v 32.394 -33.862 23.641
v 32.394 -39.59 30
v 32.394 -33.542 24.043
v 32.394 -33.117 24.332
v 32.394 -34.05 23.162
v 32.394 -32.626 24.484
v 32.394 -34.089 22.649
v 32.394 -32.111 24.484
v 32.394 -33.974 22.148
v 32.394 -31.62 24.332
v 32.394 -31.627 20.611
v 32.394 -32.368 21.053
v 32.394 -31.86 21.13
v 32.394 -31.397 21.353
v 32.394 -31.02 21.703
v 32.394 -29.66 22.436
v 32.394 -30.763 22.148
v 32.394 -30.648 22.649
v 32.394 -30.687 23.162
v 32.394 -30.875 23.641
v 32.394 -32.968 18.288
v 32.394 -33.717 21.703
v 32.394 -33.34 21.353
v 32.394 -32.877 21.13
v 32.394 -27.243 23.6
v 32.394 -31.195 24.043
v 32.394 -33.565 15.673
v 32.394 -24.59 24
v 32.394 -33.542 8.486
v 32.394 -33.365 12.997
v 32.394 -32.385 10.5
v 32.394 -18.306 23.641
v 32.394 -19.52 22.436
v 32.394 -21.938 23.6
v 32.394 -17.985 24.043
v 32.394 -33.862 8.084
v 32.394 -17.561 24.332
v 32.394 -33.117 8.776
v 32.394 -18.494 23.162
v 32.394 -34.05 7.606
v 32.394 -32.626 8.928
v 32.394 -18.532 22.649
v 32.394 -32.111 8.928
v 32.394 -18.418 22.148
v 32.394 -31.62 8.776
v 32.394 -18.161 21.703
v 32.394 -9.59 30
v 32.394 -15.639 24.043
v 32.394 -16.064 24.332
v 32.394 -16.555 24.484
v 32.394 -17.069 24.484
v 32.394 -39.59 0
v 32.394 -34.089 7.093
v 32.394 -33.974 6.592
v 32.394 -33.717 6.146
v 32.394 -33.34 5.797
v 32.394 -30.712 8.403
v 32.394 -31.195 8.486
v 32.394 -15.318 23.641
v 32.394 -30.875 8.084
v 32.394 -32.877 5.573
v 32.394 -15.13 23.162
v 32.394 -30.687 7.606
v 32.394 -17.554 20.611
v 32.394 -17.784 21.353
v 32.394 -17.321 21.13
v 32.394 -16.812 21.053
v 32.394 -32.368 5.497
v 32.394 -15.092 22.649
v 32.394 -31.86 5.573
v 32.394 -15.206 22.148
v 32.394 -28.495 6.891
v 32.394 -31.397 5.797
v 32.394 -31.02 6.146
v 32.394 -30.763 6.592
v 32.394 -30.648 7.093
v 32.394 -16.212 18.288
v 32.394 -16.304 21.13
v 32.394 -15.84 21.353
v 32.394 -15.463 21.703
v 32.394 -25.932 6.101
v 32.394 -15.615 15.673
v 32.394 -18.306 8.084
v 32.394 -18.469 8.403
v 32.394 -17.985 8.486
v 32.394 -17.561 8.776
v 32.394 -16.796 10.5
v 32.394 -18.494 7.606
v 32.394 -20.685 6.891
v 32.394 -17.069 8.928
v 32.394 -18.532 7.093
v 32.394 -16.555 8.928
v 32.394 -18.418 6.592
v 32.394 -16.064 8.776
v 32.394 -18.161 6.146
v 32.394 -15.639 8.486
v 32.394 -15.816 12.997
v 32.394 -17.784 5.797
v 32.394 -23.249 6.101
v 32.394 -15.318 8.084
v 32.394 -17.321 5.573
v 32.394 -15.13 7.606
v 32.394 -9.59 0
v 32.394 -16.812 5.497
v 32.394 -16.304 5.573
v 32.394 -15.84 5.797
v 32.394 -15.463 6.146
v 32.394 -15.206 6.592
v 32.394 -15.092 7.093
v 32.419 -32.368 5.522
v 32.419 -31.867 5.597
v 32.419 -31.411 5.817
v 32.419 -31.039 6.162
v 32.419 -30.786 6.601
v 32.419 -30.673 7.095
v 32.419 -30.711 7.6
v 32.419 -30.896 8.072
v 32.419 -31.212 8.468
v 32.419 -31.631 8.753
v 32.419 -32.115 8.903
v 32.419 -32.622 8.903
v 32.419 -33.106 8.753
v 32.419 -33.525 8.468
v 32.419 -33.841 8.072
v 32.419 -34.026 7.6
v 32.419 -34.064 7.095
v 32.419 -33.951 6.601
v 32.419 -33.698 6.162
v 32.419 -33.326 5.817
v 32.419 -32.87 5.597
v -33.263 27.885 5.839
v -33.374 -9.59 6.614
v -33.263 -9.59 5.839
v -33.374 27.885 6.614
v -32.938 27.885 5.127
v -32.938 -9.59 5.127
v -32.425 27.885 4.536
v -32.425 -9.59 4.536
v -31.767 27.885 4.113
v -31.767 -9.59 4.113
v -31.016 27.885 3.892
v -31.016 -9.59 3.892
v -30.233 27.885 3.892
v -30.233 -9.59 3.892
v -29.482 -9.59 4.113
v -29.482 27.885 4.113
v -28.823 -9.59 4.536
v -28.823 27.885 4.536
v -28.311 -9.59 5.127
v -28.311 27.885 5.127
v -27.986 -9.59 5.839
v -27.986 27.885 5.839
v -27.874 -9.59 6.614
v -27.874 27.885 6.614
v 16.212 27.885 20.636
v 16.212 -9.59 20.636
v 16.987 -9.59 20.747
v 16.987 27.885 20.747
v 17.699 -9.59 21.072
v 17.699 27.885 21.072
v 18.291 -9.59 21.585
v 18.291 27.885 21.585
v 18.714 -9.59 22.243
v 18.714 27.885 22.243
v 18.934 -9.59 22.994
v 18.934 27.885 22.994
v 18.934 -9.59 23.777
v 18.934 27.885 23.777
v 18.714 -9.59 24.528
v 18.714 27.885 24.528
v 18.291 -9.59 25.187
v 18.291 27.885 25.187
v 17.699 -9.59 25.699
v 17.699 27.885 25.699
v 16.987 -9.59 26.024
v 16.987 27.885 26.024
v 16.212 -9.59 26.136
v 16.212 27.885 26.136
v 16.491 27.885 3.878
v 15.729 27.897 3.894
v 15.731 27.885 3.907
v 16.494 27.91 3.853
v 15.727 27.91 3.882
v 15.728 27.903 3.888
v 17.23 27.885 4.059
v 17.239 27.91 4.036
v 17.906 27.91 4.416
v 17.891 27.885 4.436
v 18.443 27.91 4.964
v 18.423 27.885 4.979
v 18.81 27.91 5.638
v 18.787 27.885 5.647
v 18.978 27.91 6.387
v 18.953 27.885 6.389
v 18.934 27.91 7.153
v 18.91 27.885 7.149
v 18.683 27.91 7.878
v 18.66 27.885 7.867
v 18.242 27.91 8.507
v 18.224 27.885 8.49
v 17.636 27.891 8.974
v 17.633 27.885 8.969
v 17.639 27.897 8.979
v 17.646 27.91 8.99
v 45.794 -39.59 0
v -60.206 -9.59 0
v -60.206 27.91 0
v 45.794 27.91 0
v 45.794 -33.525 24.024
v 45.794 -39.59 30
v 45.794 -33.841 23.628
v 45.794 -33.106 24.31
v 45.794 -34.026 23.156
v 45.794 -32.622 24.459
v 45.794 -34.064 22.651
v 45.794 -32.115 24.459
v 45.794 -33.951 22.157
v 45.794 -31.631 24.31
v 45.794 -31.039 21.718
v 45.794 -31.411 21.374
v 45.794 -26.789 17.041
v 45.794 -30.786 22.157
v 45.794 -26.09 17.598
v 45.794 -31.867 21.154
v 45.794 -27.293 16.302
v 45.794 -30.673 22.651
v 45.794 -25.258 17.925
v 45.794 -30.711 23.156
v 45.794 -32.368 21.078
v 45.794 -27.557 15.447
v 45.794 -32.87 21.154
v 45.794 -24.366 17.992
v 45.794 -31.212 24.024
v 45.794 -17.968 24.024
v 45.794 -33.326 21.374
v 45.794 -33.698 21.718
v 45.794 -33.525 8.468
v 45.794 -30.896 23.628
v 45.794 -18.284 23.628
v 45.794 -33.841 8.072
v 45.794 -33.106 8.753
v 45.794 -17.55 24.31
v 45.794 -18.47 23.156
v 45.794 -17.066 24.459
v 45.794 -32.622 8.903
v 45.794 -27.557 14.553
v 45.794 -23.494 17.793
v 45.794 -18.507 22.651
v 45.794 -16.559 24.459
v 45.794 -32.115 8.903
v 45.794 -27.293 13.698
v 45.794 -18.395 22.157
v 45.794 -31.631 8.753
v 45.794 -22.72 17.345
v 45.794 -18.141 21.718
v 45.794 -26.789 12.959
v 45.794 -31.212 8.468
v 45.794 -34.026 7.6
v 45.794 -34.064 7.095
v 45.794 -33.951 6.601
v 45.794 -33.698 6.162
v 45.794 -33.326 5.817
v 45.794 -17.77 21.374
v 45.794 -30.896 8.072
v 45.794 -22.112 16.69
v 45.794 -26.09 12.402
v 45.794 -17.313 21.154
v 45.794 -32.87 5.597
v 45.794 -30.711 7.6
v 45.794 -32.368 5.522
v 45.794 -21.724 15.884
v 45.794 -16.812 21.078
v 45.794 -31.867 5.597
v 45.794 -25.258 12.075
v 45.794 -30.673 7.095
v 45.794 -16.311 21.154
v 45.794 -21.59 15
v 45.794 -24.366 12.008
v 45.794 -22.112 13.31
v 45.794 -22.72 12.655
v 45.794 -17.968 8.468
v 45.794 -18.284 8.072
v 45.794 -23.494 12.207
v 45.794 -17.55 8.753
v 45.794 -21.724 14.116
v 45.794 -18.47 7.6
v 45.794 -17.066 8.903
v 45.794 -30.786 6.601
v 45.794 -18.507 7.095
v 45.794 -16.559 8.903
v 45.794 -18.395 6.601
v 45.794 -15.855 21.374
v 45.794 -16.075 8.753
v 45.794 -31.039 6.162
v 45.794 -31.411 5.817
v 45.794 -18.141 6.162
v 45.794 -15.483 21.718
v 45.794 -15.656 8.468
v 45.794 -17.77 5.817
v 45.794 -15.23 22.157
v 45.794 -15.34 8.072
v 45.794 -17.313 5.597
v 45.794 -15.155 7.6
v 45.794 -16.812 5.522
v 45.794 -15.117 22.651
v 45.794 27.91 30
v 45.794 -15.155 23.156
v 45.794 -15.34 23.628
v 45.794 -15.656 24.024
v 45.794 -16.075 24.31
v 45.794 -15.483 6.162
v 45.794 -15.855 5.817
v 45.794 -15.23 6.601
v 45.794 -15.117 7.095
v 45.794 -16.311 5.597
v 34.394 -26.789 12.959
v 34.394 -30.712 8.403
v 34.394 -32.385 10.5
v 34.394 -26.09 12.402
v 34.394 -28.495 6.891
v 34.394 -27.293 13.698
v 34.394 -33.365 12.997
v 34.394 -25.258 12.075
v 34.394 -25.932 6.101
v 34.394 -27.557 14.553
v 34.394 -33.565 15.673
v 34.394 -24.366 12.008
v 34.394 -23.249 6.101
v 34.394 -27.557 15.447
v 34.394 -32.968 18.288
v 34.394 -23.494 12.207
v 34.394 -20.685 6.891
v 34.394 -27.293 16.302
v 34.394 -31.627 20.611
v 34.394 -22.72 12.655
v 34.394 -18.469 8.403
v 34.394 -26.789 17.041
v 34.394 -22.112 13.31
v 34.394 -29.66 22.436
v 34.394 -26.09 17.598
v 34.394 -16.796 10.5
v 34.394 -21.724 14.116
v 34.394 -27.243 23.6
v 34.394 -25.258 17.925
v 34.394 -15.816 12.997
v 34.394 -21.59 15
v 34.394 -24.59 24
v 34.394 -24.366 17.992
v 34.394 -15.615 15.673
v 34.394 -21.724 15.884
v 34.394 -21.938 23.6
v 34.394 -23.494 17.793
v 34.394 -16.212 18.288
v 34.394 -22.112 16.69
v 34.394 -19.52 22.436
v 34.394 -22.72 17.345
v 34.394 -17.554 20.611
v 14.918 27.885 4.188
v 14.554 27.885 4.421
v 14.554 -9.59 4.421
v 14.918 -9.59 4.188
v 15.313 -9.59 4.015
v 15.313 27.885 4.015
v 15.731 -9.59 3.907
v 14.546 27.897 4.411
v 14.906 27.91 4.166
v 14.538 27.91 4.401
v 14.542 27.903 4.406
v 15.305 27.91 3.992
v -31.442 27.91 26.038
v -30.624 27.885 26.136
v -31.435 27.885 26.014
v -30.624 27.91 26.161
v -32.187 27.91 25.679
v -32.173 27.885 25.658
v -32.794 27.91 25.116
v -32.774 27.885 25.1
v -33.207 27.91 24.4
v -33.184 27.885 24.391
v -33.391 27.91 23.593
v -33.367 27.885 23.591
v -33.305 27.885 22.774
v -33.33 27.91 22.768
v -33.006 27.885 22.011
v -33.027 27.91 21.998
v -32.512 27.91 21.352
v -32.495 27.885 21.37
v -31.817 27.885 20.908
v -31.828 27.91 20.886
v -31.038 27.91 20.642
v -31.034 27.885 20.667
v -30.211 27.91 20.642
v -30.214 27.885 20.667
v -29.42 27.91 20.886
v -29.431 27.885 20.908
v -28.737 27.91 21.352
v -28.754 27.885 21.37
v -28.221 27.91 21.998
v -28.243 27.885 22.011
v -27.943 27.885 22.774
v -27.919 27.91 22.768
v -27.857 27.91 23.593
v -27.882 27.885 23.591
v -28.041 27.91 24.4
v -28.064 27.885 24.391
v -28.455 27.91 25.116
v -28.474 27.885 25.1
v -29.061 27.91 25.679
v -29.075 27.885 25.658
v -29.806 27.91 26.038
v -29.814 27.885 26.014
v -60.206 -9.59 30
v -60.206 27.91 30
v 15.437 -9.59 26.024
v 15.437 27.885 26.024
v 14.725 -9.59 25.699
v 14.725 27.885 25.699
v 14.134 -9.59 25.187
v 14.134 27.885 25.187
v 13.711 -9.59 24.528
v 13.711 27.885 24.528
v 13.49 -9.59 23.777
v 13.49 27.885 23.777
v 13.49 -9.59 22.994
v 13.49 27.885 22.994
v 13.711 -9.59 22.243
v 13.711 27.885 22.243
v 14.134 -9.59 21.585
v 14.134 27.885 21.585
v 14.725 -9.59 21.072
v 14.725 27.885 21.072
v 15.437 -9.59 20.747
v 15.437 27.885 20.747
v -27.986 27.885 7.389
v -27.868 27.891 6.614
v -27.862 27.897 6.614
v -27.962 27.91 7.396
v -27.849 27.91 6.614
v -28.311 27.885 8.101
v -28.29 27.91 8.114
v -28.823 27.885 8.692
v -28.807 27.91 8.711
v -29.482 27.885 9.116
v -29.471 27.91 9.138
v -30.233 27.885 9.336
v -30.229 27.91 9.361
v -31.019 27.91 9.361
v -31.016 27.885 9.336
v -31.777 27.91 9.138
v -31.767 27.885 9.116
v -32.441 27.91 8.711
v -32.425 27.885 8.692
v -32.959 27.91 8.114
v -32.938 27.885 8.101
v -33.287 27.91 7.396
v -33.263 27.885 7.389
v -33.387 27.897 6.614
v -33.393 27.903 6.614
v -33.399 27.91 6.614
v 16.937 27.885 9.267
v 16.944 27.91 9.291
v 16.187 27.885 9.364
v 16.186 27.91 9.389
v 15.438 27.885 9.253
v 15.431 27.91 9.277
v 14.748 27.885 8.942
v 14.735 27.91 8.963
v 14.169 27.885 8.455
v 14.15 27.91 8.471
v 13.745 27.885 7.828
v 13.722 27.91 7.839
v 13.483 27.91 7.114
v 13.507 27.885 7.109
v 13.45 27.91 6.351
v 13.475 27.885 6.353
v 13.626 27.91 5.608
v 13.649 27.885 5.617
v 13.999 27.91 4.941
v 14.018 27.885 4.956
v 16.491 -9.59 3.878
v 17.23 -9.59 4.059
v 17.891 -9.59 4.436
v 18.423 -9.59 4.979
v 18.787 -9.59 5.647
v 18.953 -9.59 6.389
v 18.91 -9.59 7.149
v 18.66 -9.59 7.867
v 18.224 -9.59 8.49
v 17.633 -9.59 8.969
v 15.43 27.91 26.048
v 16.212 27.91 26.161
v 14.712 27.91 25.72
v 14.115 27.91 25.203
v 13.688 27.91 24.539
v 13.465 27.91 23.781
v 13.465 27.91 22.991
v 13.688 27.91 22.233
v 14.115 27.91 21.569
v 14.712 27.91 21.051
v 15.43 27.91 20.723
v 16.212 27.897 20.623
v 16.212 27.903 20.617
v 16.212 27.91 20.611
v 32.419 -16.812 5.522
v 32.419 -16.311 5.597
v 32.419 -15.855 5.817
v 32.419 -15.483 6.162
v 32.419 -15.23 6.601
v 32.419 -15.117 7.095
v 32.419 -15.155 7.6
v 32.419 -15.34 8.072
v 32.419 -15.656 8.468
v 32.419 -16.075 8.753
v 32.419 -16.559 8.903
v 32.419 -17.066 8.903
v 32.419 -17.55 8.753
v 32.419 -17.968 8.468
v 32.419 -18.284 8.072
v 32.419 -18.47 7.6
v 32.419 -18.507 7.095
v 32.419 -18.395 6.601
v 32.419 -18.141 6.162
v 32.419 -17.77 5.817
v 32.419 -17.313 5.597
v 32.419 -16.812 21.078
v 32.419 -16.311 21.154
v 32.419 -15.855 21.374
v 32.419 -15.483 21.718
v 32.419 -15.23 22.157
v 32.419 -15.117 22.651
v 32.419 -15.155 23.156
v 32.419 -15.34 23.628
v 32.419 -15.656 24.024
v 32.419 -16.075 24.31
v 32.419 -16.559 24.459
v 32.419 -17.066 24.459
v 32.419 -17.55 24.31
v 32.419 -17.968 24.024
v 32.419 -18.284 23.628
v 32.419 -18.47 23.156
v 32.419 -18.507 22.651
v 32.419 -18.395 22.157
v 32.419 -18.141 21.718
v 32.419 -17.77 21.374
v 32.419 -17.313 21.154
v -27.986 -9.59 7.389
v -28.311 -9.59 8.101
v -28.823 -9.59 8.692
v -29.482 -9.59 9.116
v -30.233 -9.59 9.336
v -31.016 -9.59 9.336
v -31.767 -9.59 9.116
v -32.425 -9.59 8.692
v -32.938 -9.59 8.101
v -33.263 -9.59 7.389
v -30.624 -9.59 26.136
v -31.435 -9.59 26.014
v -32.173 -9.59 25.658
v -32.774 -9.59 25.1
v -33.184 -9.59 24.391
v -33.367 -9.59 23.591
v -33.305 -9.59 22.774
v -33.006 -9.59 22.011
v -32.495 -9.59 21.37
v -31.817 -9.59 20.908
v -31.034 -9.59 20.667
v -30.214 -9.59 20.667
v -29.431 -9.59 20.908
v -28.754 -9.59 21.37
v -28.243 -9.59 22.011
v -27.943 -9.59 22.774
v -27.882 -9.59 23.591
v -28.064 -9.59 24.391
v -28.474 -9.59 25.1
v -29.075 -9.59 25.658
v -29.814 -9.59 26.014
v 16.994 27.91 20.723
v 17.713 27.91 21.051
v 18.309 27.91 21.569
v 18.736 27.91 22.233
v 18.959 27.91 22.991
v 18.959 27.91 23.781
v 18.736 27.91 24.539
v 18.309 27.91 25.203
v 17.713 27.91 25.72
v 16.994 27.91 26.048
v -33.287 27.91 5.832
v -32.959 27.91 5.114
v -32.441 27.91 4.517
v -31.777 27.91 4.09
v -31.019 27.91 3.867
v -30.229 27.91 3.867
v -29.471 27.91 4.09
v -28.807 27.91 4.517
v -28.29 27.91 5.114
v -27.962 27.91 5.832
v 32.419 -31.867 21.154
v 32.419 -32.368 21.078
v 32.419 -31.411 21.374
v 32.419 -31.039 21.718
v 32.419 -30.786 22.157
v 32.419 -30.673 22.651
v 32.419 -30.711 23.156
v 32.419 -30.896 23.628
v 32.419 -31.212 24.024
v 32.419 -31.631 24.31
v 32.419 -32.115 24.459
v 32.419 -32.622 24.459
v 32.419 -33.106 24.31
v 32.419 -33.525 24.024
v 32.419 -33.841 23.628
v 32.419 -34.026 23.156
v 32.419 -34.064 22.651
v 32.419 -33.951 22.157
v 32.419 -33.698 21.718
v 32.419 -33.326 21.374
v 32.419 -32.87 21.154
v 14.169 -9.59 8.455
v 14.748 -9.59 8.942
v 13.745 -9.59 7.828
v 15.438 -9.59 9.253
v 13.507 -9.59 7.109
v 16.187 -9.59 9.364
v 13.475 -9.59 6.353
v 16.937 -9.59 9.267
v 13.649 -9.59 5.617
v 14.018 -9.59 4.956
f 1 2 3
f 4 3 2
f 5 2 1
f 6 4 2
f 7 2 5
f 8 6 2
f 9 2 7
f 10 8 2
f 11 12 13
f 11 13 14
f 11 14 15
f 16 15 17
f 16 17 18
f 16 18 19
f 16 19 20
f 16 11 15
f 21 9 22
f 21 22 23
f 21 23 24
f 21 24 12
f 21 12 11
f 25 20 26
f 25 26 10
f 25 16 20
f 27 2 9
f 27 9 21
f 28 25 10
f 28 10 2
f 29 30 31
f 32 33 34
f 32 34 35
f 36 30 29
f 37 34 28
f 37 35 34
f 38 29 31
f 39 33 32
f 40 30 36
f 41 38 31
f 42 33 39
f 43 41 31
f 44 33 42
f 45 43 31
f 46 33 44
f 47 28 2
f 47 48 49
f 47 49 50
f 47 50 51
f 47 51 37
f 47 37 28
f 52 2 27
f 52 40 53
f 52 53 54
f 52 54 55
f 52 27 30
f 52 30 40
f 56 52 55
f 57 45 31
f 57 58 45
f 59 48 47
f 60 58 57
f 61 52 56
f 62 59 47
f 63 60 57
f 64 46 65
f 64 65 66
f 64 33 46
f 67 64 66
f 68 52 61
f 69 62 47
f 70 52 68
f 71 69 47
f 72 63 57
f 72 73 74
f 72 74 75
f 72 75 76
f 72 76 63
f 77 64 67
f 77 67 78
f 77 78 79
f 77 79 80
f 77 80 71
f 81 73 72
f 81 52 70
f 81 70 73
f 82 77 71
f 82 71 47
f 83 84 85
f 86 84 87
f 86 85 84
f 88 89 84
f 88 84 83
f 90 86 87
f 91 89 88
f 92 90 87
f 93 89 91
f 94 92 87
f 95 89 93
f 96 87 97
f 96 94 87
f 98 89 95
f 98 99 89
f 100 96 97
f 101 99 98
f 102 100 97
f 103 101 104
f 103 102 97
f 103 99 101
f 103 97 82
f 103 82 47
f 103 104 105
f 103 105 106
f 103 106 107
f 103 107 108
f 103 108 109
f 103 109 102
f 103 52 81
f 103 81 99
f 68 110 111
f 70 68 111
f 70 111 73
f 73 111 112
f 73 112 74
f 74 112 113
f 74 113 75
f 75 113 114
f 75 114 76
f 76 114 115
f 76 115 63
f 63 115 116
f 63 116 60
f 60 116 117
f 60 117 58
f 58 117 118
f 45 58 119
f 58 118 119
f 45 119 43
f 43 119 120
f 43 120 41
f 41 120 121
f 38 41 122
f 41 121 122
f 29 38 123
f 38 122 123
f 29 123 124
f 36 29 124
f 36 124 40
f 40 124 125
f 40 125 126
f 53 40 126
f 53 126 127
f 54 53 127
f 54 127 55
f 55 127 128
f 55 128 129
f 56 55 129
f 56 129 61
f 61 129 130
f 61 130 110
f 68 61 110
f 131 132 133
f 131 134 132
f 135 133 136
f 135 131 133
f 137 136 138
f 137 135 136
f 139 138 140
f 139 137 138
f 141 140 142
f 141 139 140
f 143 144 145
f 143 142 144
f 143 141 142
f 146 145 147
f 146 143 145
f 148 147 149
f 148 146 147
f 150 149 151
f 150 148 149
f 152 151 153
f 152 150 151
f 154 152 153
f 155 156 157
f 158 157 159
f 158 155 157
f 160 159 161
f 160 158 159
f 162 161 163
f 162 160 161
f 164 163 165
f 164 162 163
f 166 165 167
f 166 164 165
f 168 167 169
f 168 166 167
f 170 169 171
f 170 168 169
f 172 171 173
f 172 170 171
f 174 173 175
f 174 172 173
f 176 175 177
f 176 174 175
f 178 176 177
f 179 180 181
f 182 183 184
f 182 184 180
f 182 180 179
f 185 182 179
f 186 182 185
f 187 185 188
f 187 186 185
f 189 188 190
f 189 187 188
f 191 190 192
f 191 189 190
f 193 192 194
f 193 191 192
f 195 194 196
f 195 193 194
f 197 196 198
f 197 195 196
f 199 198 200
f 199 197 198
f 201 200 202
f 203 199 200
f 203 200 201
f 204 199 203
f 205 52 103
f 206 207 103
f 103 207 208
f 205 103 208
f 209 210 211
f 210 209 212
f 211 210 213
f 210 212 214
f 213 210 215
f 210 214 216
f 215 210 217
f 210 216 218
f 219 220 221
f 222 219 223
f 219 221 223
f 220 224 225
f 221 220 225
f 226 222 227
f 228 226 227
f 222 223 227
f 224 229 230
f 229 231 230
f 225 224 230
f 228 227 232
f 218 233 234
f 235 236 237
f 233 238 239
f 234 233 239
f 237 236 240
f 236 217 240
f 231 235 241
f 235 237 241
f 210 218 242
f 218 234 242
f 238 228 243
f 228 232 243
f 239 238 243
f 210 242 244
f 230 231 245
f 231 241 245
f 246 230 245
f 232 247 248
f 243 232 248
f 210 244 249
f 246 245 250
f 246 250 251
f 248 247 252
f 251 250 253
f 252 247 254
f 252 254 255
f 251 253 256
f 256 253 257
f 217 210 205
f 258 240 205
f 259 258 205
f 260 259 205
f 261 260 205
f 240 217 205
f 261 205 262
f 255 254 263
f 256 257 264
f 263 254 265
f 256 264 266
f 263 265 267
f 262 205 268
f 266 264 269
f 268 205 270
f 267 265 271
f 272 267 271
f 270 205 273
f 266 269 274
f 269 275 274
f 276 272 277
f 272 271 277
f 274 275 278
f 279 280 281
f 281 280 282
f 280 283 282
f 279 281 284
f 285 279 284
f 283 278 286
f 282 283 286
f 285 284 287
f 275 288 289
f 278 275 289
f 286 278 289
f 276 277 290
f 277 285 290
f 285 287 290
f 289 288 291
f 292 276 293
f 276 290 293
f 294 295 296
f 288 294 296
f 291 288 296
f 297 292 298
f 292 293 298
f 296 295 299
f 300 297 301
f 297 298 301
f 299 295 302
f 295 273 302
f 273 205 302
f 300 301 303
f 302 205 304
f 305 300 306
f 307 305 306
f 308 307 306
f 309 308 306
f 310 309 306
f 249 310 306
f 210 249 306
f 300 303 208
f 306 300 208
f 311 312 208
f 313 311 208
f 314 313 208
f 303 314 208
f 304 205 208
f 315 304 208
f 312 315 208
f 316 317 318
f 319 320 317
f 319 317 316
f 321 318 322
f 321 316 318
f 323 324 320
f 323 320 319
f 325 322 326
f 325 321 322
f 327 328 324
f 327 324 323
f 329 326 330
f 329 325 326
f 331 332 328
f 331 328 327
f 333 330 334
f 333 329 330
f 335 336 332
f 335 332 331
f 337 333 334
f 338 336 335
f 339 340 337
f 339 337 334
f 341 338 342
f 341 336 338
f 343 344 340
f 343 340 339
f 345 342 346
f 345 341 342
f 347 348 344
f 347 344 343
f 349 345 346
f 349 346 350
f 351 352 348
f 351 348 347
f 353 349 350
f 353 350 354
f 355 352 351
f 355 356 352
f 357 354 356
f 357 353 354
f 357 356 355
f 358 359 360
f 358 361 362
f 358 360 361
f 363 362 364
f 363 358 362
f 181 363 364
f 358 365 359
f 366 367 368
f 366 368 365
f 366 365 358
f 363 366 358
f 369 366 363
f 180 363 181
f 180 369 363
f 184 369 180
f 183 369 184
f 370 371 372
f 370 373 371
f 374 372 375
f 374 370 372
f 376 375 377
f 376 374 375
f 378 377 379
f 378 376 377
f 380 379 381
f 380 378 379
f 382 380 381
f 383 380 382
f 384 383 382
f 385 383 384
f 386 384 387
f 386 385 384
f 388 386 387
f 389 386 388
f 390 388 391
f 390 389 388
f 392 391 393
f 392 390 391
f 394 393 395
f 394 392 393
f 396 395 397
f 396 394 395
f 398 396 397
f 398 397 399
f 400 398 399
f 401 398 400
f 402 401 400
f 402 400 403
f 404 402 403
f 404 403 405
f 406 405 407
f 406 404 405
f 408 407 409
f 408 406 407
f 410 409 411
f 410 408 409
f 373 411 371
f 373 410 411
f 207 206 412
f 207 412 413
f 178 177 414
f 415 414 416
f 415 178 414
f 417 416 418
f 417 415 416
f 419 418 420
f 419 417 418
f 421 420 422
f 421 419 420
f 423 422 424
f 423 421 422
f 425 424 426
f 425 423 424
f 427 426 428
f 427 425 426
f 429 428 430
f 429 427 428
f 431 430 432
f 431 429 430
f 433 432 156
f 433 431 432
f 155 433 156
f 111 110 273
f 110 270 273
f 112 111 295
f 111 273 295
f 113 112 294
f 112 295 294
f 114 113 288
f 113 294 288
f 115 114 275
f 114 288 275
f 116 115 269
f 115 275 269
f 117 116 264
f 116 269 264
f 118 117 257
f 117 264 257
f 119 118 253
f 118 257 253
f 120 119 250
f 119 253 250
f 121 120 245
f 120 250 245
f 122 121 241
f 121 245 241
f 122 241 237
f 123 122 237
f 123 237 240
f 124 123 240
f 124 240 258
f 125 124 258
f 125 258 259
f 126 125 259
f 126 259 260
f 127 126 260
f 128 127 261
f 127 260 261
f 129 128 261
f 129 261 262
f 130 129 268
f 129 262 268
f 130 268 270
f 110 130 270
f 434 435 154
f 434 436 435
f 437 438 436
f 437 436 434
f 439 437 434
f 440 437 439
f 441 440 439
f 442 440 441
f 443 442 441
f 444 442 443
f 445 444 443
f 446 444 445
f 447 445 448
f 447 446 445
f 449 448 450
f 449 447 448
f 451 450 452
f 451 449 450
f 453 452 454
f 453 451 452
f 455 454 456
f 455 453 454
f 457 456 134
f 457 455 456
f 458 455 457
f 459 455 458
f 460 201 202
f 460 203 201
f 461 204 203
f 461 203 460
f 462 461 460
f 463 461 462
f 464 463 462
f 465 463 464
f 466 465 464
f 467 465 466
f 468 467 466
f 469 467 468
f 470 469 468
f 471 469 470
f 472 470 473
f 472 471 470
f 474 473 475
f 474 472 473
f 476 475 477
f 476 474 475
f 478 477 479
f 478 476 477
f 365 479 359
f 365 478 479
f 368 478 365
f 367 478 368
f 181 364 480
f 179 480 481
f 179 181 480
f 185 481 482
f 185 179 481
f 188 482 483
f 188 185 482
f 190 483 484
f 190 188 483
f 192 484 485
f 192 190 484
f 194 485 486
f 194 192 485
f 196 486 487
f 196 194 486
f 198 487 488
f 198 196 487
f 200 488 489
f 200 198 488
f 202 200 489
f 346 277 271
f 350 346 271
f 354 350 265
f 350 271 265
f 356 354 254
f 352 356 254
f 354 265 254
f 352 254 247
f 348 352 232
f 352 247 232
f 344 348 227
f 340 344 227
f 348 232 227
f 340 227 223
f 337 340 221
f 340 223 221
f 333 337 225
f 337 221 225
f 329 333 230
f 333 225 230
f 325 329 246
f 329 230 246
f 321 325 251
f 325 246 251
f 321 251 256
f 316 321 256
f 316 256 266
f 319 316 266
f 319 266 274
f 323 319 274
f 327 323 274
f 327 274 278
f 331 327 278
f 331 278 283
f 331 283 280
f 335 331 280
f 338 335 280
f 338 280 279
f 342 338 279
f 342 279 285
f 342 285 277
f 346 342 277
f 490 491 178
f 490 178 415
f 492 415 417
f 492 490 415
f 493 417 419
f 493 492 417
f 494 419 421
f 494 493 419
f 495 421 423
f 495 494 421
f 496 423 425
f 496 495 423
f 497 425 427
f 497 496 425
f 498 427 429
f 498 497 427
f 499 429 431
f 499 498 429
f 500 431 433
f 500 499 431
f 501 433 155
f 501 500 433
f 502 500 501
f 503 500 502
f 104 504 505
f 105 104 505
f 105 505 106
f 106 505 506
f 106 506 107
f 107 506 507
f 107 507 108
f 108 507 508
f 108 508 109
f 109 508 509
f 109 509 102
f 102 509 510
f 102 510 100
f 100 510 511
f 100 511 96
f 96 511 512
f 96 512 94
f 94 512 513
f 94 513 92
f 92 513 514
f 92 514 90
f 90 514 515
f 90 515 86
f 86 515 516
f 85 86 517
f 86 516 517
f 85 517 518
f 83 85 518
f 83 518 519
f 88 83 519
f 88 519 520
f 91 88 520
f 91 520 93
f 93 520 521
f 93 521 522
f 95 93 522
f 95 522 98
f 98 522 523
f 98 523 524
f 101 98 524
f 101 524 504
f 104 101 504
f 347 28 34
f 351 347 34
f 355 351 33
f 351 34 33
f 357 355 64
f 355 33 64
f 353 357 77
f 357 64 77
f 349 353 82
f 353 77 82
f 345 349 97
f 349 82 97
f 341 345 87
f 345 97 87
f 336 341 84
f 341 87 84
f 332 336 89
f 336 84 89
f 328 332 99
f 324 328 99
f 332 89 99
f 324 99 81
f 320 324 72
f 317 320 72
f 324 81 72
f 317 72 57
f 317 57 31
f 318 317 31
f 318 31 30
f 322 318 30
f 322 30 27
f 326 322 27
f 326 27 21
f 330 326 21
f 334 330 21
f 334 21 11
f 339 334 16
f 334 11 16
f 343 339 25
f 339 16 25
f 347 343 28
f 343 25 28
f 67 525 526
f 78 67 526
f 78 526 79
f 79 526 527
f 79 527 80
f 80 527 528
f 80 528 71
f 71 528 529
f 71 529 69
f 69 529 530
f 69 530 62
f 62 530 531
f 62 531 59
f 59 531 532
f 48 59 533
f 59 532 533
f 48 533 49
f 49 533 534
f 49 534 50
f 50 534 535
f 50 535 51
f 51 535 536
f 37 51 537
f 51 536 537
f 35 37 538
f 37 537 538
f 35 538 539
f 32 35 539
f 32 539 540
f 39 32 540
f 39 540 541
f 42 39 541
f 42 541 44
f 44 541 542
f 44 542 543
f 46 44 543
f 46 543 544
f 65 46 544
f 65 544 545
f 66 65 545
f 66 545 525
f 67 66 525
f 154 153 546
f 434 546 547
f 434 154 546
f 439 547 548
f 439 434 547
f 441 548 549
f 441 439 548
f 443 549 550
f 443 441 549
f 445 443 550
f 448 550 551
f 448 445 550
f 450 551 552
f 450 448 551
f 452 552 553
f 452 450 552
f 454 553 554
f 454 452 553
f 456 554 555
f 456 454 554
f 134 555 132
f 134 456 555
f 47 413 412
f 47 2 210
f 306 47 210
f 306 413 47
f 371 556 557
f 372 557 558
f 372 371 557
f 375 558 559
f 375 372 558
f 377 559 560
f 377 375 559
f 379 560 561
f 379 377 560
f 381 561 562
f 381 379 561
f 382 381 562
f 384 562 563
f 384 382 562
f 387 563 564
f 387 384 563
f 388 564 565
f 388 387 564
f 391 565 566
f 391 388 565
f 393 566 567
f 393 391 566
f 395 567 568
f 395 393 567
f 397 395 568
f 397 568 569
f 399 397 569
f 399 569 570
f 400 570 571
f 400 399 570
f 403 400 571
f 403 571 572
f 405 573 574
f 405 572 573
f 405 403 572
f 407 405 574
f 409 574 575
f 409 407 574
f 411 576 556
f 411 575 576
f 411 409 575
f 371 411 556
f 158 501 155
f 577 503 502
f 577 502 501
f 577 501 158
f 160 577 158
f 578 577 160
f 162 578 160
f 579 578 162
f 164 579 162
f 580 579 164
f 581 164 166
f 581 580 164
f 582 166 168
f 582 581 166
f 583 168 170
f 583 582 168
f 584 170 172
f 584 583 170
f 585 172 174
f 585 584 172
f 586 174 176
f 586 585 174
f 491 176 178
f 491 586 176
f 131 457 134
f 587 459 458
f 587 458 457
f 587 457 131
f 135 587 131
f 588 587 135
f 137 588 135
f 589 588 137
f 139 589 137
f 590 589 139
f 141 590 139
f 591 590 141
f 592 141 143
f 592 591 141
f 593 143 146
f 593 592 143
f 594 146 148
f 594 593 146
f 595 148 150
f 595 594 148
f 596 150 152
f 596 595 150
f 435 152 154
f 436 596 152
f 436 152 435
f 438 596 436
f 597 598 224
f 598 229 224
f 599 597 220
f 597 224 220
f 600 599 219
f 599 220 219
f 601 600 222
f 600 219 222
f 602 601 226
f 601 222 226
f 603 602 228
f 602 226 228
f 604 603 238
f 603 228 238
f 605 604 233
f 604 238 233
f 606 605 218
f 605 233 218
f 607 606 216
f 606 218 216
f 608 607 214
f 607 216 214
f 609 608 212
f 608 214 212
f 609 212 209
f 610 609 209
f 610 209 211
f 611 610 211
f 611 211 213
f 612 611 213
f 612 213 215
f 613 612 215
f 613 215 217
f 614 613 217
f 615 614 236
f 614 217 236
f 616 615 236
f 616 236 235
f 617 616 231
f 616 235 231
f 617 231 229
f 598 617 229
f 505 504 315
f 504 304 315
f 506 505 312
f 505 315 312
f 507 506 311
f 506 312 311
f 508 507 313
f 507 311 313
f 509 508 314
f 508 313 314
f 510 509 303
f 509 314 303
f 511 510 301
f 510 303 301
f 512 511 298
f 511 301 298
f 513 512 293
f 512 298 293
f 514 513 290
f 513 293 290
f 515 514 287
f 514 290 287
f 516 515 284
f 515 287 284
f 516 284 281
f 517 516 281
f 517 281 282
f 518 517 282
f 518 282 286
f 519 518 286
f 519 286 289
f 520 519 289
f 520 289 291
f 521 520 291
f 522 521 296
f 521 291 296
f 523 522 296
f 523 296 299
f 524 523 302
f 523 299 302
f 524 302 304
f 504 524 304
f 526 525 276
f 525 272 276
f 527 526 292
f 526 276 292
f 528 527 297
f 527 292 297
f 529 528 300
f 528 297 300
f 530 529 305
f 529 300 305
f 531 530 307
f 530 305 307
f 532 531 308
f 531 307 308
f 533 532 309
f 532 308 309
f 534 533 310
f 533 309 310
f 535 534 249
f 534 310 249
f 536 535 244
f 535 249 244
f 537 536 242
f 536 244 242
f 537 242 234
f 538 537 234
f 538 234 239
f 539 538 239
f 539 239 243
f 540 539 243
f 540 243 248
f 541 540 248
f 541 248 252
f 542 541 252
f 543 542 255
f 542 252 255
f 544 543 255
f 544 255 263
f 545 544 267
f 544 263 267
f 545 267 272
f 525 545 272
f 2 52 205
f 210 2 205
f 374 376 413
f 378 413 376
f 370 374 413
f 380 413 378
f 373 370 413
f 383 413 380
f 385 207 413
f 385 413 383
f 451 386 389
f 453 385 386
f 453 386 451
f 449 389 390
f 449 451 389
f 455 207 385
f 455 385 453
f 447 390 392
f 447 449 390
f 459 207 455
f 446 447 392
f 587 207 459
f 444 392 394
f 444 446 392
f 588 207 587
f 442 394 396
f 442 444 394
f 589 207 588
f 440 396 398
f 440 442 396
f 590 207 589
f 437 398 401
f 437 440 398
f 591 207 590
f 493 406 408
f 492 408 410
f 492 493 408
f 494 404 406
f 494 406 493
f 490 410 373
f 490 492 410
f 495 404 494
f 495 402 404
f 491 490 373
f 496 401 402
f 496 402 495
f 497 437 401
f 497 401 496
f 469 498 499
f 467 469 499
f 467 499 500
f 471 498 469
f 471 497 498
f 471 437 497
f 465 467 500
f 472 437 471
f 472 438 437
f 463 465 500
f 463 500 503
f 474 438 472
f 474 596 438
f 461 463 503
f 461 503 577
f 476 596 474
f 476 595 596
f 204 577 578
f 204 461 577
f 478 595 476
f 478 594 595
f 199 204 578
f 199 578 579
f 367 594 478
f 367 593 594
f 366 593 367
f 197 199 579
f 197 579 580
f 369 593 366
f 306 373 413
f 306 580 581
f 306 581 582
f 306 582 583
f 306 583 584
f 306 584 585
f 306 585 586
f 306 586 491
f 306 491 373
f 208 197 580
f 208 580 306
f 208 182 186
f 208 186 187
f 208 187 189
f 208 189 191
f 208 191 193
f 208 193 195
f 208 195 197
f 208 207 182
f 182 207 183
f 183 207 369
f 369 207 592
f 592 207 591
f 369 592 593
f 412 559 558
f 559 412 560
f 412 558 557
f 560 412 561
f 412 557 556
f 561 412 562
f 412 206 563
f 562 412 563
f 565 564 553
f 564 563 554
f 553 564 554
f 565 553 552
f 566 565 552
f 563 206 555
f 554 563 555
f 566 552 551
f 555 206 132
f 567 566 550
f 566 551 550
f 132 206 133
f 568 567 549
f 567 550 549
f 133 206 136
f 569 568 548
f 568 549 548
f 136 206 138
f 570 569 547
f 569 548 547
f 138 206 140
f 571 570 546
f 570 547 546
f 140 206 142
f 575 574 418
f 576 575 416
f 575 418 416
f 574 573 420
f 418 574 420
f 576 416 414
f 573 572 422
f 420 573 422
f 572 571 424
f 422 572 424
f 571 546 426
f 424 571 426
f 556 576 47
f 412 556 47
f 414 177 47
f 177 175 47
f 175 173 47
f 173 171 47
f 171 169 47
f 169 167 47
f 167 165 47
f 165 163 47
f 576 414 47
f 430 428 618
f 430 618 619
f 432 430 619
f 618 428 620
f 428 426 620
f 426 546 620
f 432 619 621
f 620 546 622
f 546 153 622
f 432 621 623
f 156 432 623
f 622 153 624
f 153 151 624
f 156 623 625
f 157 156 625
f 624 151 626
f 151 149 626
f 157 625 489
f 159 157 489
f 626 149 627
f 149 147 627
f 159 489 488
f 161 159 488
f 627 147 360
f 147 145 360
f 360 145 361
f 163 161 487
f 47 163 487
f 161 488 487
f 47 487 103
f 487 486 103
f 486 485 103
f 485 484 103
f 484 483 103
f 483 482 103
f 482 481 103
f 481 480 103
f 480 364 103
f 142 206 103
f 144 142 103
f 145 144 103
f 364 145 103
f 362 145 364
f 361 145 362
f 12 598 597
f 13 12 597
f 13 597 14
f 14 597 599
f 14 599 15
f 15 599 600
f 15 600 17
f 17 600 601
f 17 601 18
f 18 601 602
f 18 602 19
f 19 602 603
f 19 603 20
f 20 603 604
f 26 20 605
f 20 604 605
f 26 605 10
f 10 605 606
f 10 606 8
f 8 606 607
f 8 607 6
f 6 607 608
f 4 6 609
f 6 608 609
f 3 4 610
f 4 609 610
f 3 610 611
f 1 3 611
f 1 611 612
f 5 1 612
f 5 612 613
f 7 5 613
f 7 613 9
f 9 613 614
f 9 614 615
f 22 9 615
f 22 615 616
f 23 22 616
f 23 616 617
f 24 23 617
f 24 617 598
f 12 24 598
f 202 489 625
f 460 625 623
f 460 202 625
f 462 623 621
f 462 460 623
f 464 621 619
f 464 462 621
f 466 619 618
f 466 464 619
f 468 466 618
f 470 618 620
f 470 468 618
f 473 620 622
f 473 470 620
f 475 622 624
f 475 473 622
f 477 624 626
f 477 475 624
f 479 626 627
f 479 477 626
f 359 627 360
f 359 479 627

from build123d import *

# Parameters (mm, degrees)
SKETCH1_W                      = 106
SKETCH1_H                      = 67.5
BOSS_EXTRUDE1_DEPTH            = 30
SKETCH2_W                      = 92.6
SKETCH2_H                      = 30
BOSS_EXTRUDE2_DEPTH            = 30
SKETCH3_W                      = 92.6
SKETCH3_H                      = 30
CUT_EXTRUDE1_DEPTH             = 30
SKETCH4_R                      = 3
CUT_EXTRUDE2_DEPTH             = 30
M3_CLEARANCE_HOLE1_D           = 3.4
M3_CLEARANCE_HOLE1_CSINK_D     = 3.45
M3_CLEARANCE_HOLE1_CSINK_ANGLE = 90
SKETCH11_R                     = 9
CUT_EXTRUDE3_DEPTH             = 2
M5_CLEARANCE_HOLE1_AT_2_COUNT  = 2
M5_CLEARANCE_HOLE1_AT_2_PITCH  = 49.748811611
M5_CLEARANCE_HOLE1_AT_3_COUNT  = 2
M5_CLEARANCE_HOLE1_AT_3_PITCH  = 46.836464196
M5_CLEARANCE_HOLE1_AT_4_COUNT  = 2
M5_CLEARANCE_HOLE1_AT_4_PITCH  = 16.77169873
M5_CLEARANCE_HOLE1_AT_5_COUNT  = 2
M5_CLEARANCE_HOLE1_AT_5_PITCH  = 16.771686167
M5_CLEARANCE_HOLE1_AT_6_COUNT  = 2
M5_CLEARANCE_HOLE1_AT_6_PITCH  = 49.748806755
M5_CLEARANCE_HOLE1_AT_7_COUNT  = 2
M5_CLEARANCE_HOLE1_AT_7_PITCH  = 49.748790588
M5_CLEARANCE_HOLE1_AT_8_COUNT  = 2
M5_CLEARANCE_HOLE1_AT_8_PITCH  = 46.836452861


with BuildPart() as part:
    # Sketch1 → Boss-Extrude1 (new body)
    with BuildSketch(Plane.XY):
        with Locations((-7.205998582, -5.840323621)):
            Rectangle(SKETCH1_W, SKETCH1_H)
    extrude(amount=BOSS_EXTRUDE1_DEPTH)

    # Sketch2 → Boss-Extrude2 (add)
    with BuildSketch(Plane.XY):
        with Locations((-13.905998582, -24.590323621)):
            Rectangle(SKETCH2_W, SKETCH2_H)
    extrude(amount=BOSS_EXTRUDE2_DEPTH)

    # Sketch3 → Cut-Extrude1 (cut)
    with BuildSketch(Plane.XY):
        with Locations((-13.905998582, -24.590323621)):
            Rectangle(SKETCH3_W, SKETCH3_H)
    extrude(amount=CUT_EXTRUDE1_DEPTH, mode=Mode.SUBTRACT)

    # Sketch4 → Cut-Extrude2 (cut)
    with BuildSketch(Plane(origin=(45.794001418, 0, 0), x_dir=(0, 0, -1), z_dir=(1, 0, 0))):
        with Locations(Location((-15, -24.590323621, 0), (0, 0, 90))):
            Circle(SKETCH4_R)
    extrude(amount=-CUT_EXTRUDE2_DEPTH, mode=Mode.SUBTRACT)

    # M3 Clearance Hole1 (through all)
    with Locations(Plane.ZY.offset(-32.394001418)):
        with Locations((7.221825407, -32.368498214), (7.221825407, -16.812149028), (22.778174593, -16.812149028), (22.778174593, -32.368498214)):
            CounterSinkHole(M3_CLEARANCE_HOLE1_D / 2, M3_CLEARANCE_HOLE1_CSINK_D / 2, counter_sink_angle=M3_CLEARANCE_HOLE1_CSINK_ANGLE)

    # Sketch11 → Cut-Extrude3 (cut)
    with BuildSketch(Plane.ZY.offset(-32.394001418)):
        with Locations((15, -24.590323621)):
            Circle(SKETCH11_R)
    extrude(amount=-CUT_EXTRUDE3_DEPTH, mode=Mode.SUBTRACT)

    # Sketch12 → M5 Clearance Hole1 (revolve, cut)
    with BuildSketch(Plane(origin=(-30.624223061, 27.909676379, 23.385849743), x_dir=(0, 0, 1), z_dir=(1, 0, 0))):
        Polygon((0, 0), (0, 67.5), (2.75, 67.5), (2.75, 0.025), (2.775, 0), align=None)
    m5_clearance_hole1 = revolve(axis=Axis((-30.624223061, 34.259676379, 23.385849743), (0, -1, 0)), mode=Mode.SUBTRACT)

    # M5 Clearance Hole1 at 2: M5 Clearance Hole1 ×2
    with Locations(*[Vector(0.9414589550934056, 0, -0.3371276254987612) * (i * M5_CLEARANCE_HOLE1_AT_2_PITCH) for i in range(1, M5_CLEARANCE_HOLE1_AT_2_COUNT)]):
        add(m5_clearance_hole1, mode=Mode.SUBTRACT)

    # M5 Clearance Hole1 at 3: M5 Clearance Hole1 ×2
    with Locations(*[(i * M5_CLEARANCE_HOLE1_AT_3_PITCH, 0, 0) for i in range(1, M5_CLEARANCE_HOLE1_AT_3_COUNT)]):
        add(m5_clearance_hole1, mode=Mode.SUBTRACT)

    # M5 Clearance Hole1 at 4: M5 Clearance Hole1 ×2
    with Locations(*[(0, 0, -i * M5_CLEARANCE_HOLE1_AT_4_PITCH) for i in range(1, M5_CLEARANCE_HOLE1_AT_4_COUNT)]):
        add(m5_clearance_hole1, mode=Mode.SUBTRACT)

    # M5 Clearance Hole1 at 5: M5 Clearance Hole1 ×2
    with Locations(*[(0, 0, -i * M5_CLEARANCE_HOLE1_AT_5_PITCH) for i in range(1, M5_CLEARANCE_HOLE1_AT_5_COUNT)]):
        add(m5_clearance_hole1, mode=Mode.SUBTRACT)

    # M5 Clearance Hole1 at 6: M5 Clearance Hole1 ×2
    with Locations(*[Vector(0.9414589495083403, 0, -0.33712764109555354) * (i * M5_CLEARANCE_HOLE1_AT_6_PITCH) for i in range(1, M5_CLEARANCE_HOLE1_AT_6_COUNT)]):
        add(m5_clearance_hole1, mode=Mode.SUBTRACT)

    # M5 Clearance Hole1 at 7: M5 Clearance Hole1 ×2
    with Locations(*[Vector(0.9414589838280241, 0, -0.3371275452547662) * (i * M5_CLEARANCE_HOLE1_AT_7_PITCH) for i in range(1, M5_CLEARANCE_HOLE1_AT_7_COUNT)]):
        add(m5_clearance_hole1, mode=Mode.SUBTRACT)

    # M5 Clearance Hole1 at 8: M5 Clearance Hole1 ×2
    with Locations(*[(i * M5_CLEARANCE_HOLE1_AT_8_PITCH, 0, 0) for i in range(1, M5_CLEARANCE_HOLE1_AT_8_COUNT)]):
        add(m5_clearance_hole1, mode=Mode.SUBTRACT)


solid = part.part
